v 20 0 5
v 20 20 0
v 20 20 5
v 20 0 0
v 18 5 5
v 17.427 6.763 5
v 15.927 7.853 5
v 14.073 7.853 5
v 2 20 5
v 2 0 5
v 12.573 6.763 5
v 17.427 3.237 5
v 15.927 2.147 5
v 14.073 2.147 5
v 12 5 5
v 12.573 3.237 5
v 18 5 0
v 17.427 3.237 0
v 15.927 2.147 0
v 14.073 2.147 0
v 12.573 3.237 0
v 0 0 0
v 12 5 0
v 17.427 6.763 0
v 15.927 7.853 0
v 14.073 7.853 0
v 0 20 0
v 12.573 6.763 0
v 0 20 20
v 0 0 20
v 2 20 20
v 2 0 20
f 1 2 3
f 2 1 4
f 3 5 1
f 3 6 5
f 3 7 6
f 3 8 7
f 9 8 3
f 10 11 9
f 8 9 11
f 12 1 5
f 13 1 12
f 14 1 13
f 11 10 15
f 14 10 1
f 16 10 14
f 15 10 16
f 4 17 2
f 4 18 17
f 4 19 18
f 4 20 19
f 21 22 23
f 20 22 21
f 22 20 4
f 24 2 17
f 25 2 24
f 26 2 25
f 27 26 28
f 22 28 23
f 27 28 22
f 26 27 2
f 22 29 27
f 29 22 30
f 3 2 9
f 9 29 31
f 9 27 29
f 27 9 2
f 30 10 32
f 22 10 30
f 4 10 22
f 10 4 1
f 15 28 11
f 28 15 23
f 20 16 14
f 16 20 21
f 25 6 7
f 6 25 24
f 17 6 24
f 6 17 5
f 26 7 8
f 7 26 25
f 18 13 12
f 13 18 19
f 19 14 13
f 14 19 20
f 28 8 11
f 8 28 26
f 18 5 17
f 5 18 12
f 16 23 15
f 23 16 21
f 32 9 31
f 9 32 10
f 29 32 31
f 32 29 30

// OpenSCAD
	difference() {
		cube([20,20,5]);
		translate([15, 5, 0]) {cylinder(5, r=3);}
	}

	cube([2, 20, 20]);
